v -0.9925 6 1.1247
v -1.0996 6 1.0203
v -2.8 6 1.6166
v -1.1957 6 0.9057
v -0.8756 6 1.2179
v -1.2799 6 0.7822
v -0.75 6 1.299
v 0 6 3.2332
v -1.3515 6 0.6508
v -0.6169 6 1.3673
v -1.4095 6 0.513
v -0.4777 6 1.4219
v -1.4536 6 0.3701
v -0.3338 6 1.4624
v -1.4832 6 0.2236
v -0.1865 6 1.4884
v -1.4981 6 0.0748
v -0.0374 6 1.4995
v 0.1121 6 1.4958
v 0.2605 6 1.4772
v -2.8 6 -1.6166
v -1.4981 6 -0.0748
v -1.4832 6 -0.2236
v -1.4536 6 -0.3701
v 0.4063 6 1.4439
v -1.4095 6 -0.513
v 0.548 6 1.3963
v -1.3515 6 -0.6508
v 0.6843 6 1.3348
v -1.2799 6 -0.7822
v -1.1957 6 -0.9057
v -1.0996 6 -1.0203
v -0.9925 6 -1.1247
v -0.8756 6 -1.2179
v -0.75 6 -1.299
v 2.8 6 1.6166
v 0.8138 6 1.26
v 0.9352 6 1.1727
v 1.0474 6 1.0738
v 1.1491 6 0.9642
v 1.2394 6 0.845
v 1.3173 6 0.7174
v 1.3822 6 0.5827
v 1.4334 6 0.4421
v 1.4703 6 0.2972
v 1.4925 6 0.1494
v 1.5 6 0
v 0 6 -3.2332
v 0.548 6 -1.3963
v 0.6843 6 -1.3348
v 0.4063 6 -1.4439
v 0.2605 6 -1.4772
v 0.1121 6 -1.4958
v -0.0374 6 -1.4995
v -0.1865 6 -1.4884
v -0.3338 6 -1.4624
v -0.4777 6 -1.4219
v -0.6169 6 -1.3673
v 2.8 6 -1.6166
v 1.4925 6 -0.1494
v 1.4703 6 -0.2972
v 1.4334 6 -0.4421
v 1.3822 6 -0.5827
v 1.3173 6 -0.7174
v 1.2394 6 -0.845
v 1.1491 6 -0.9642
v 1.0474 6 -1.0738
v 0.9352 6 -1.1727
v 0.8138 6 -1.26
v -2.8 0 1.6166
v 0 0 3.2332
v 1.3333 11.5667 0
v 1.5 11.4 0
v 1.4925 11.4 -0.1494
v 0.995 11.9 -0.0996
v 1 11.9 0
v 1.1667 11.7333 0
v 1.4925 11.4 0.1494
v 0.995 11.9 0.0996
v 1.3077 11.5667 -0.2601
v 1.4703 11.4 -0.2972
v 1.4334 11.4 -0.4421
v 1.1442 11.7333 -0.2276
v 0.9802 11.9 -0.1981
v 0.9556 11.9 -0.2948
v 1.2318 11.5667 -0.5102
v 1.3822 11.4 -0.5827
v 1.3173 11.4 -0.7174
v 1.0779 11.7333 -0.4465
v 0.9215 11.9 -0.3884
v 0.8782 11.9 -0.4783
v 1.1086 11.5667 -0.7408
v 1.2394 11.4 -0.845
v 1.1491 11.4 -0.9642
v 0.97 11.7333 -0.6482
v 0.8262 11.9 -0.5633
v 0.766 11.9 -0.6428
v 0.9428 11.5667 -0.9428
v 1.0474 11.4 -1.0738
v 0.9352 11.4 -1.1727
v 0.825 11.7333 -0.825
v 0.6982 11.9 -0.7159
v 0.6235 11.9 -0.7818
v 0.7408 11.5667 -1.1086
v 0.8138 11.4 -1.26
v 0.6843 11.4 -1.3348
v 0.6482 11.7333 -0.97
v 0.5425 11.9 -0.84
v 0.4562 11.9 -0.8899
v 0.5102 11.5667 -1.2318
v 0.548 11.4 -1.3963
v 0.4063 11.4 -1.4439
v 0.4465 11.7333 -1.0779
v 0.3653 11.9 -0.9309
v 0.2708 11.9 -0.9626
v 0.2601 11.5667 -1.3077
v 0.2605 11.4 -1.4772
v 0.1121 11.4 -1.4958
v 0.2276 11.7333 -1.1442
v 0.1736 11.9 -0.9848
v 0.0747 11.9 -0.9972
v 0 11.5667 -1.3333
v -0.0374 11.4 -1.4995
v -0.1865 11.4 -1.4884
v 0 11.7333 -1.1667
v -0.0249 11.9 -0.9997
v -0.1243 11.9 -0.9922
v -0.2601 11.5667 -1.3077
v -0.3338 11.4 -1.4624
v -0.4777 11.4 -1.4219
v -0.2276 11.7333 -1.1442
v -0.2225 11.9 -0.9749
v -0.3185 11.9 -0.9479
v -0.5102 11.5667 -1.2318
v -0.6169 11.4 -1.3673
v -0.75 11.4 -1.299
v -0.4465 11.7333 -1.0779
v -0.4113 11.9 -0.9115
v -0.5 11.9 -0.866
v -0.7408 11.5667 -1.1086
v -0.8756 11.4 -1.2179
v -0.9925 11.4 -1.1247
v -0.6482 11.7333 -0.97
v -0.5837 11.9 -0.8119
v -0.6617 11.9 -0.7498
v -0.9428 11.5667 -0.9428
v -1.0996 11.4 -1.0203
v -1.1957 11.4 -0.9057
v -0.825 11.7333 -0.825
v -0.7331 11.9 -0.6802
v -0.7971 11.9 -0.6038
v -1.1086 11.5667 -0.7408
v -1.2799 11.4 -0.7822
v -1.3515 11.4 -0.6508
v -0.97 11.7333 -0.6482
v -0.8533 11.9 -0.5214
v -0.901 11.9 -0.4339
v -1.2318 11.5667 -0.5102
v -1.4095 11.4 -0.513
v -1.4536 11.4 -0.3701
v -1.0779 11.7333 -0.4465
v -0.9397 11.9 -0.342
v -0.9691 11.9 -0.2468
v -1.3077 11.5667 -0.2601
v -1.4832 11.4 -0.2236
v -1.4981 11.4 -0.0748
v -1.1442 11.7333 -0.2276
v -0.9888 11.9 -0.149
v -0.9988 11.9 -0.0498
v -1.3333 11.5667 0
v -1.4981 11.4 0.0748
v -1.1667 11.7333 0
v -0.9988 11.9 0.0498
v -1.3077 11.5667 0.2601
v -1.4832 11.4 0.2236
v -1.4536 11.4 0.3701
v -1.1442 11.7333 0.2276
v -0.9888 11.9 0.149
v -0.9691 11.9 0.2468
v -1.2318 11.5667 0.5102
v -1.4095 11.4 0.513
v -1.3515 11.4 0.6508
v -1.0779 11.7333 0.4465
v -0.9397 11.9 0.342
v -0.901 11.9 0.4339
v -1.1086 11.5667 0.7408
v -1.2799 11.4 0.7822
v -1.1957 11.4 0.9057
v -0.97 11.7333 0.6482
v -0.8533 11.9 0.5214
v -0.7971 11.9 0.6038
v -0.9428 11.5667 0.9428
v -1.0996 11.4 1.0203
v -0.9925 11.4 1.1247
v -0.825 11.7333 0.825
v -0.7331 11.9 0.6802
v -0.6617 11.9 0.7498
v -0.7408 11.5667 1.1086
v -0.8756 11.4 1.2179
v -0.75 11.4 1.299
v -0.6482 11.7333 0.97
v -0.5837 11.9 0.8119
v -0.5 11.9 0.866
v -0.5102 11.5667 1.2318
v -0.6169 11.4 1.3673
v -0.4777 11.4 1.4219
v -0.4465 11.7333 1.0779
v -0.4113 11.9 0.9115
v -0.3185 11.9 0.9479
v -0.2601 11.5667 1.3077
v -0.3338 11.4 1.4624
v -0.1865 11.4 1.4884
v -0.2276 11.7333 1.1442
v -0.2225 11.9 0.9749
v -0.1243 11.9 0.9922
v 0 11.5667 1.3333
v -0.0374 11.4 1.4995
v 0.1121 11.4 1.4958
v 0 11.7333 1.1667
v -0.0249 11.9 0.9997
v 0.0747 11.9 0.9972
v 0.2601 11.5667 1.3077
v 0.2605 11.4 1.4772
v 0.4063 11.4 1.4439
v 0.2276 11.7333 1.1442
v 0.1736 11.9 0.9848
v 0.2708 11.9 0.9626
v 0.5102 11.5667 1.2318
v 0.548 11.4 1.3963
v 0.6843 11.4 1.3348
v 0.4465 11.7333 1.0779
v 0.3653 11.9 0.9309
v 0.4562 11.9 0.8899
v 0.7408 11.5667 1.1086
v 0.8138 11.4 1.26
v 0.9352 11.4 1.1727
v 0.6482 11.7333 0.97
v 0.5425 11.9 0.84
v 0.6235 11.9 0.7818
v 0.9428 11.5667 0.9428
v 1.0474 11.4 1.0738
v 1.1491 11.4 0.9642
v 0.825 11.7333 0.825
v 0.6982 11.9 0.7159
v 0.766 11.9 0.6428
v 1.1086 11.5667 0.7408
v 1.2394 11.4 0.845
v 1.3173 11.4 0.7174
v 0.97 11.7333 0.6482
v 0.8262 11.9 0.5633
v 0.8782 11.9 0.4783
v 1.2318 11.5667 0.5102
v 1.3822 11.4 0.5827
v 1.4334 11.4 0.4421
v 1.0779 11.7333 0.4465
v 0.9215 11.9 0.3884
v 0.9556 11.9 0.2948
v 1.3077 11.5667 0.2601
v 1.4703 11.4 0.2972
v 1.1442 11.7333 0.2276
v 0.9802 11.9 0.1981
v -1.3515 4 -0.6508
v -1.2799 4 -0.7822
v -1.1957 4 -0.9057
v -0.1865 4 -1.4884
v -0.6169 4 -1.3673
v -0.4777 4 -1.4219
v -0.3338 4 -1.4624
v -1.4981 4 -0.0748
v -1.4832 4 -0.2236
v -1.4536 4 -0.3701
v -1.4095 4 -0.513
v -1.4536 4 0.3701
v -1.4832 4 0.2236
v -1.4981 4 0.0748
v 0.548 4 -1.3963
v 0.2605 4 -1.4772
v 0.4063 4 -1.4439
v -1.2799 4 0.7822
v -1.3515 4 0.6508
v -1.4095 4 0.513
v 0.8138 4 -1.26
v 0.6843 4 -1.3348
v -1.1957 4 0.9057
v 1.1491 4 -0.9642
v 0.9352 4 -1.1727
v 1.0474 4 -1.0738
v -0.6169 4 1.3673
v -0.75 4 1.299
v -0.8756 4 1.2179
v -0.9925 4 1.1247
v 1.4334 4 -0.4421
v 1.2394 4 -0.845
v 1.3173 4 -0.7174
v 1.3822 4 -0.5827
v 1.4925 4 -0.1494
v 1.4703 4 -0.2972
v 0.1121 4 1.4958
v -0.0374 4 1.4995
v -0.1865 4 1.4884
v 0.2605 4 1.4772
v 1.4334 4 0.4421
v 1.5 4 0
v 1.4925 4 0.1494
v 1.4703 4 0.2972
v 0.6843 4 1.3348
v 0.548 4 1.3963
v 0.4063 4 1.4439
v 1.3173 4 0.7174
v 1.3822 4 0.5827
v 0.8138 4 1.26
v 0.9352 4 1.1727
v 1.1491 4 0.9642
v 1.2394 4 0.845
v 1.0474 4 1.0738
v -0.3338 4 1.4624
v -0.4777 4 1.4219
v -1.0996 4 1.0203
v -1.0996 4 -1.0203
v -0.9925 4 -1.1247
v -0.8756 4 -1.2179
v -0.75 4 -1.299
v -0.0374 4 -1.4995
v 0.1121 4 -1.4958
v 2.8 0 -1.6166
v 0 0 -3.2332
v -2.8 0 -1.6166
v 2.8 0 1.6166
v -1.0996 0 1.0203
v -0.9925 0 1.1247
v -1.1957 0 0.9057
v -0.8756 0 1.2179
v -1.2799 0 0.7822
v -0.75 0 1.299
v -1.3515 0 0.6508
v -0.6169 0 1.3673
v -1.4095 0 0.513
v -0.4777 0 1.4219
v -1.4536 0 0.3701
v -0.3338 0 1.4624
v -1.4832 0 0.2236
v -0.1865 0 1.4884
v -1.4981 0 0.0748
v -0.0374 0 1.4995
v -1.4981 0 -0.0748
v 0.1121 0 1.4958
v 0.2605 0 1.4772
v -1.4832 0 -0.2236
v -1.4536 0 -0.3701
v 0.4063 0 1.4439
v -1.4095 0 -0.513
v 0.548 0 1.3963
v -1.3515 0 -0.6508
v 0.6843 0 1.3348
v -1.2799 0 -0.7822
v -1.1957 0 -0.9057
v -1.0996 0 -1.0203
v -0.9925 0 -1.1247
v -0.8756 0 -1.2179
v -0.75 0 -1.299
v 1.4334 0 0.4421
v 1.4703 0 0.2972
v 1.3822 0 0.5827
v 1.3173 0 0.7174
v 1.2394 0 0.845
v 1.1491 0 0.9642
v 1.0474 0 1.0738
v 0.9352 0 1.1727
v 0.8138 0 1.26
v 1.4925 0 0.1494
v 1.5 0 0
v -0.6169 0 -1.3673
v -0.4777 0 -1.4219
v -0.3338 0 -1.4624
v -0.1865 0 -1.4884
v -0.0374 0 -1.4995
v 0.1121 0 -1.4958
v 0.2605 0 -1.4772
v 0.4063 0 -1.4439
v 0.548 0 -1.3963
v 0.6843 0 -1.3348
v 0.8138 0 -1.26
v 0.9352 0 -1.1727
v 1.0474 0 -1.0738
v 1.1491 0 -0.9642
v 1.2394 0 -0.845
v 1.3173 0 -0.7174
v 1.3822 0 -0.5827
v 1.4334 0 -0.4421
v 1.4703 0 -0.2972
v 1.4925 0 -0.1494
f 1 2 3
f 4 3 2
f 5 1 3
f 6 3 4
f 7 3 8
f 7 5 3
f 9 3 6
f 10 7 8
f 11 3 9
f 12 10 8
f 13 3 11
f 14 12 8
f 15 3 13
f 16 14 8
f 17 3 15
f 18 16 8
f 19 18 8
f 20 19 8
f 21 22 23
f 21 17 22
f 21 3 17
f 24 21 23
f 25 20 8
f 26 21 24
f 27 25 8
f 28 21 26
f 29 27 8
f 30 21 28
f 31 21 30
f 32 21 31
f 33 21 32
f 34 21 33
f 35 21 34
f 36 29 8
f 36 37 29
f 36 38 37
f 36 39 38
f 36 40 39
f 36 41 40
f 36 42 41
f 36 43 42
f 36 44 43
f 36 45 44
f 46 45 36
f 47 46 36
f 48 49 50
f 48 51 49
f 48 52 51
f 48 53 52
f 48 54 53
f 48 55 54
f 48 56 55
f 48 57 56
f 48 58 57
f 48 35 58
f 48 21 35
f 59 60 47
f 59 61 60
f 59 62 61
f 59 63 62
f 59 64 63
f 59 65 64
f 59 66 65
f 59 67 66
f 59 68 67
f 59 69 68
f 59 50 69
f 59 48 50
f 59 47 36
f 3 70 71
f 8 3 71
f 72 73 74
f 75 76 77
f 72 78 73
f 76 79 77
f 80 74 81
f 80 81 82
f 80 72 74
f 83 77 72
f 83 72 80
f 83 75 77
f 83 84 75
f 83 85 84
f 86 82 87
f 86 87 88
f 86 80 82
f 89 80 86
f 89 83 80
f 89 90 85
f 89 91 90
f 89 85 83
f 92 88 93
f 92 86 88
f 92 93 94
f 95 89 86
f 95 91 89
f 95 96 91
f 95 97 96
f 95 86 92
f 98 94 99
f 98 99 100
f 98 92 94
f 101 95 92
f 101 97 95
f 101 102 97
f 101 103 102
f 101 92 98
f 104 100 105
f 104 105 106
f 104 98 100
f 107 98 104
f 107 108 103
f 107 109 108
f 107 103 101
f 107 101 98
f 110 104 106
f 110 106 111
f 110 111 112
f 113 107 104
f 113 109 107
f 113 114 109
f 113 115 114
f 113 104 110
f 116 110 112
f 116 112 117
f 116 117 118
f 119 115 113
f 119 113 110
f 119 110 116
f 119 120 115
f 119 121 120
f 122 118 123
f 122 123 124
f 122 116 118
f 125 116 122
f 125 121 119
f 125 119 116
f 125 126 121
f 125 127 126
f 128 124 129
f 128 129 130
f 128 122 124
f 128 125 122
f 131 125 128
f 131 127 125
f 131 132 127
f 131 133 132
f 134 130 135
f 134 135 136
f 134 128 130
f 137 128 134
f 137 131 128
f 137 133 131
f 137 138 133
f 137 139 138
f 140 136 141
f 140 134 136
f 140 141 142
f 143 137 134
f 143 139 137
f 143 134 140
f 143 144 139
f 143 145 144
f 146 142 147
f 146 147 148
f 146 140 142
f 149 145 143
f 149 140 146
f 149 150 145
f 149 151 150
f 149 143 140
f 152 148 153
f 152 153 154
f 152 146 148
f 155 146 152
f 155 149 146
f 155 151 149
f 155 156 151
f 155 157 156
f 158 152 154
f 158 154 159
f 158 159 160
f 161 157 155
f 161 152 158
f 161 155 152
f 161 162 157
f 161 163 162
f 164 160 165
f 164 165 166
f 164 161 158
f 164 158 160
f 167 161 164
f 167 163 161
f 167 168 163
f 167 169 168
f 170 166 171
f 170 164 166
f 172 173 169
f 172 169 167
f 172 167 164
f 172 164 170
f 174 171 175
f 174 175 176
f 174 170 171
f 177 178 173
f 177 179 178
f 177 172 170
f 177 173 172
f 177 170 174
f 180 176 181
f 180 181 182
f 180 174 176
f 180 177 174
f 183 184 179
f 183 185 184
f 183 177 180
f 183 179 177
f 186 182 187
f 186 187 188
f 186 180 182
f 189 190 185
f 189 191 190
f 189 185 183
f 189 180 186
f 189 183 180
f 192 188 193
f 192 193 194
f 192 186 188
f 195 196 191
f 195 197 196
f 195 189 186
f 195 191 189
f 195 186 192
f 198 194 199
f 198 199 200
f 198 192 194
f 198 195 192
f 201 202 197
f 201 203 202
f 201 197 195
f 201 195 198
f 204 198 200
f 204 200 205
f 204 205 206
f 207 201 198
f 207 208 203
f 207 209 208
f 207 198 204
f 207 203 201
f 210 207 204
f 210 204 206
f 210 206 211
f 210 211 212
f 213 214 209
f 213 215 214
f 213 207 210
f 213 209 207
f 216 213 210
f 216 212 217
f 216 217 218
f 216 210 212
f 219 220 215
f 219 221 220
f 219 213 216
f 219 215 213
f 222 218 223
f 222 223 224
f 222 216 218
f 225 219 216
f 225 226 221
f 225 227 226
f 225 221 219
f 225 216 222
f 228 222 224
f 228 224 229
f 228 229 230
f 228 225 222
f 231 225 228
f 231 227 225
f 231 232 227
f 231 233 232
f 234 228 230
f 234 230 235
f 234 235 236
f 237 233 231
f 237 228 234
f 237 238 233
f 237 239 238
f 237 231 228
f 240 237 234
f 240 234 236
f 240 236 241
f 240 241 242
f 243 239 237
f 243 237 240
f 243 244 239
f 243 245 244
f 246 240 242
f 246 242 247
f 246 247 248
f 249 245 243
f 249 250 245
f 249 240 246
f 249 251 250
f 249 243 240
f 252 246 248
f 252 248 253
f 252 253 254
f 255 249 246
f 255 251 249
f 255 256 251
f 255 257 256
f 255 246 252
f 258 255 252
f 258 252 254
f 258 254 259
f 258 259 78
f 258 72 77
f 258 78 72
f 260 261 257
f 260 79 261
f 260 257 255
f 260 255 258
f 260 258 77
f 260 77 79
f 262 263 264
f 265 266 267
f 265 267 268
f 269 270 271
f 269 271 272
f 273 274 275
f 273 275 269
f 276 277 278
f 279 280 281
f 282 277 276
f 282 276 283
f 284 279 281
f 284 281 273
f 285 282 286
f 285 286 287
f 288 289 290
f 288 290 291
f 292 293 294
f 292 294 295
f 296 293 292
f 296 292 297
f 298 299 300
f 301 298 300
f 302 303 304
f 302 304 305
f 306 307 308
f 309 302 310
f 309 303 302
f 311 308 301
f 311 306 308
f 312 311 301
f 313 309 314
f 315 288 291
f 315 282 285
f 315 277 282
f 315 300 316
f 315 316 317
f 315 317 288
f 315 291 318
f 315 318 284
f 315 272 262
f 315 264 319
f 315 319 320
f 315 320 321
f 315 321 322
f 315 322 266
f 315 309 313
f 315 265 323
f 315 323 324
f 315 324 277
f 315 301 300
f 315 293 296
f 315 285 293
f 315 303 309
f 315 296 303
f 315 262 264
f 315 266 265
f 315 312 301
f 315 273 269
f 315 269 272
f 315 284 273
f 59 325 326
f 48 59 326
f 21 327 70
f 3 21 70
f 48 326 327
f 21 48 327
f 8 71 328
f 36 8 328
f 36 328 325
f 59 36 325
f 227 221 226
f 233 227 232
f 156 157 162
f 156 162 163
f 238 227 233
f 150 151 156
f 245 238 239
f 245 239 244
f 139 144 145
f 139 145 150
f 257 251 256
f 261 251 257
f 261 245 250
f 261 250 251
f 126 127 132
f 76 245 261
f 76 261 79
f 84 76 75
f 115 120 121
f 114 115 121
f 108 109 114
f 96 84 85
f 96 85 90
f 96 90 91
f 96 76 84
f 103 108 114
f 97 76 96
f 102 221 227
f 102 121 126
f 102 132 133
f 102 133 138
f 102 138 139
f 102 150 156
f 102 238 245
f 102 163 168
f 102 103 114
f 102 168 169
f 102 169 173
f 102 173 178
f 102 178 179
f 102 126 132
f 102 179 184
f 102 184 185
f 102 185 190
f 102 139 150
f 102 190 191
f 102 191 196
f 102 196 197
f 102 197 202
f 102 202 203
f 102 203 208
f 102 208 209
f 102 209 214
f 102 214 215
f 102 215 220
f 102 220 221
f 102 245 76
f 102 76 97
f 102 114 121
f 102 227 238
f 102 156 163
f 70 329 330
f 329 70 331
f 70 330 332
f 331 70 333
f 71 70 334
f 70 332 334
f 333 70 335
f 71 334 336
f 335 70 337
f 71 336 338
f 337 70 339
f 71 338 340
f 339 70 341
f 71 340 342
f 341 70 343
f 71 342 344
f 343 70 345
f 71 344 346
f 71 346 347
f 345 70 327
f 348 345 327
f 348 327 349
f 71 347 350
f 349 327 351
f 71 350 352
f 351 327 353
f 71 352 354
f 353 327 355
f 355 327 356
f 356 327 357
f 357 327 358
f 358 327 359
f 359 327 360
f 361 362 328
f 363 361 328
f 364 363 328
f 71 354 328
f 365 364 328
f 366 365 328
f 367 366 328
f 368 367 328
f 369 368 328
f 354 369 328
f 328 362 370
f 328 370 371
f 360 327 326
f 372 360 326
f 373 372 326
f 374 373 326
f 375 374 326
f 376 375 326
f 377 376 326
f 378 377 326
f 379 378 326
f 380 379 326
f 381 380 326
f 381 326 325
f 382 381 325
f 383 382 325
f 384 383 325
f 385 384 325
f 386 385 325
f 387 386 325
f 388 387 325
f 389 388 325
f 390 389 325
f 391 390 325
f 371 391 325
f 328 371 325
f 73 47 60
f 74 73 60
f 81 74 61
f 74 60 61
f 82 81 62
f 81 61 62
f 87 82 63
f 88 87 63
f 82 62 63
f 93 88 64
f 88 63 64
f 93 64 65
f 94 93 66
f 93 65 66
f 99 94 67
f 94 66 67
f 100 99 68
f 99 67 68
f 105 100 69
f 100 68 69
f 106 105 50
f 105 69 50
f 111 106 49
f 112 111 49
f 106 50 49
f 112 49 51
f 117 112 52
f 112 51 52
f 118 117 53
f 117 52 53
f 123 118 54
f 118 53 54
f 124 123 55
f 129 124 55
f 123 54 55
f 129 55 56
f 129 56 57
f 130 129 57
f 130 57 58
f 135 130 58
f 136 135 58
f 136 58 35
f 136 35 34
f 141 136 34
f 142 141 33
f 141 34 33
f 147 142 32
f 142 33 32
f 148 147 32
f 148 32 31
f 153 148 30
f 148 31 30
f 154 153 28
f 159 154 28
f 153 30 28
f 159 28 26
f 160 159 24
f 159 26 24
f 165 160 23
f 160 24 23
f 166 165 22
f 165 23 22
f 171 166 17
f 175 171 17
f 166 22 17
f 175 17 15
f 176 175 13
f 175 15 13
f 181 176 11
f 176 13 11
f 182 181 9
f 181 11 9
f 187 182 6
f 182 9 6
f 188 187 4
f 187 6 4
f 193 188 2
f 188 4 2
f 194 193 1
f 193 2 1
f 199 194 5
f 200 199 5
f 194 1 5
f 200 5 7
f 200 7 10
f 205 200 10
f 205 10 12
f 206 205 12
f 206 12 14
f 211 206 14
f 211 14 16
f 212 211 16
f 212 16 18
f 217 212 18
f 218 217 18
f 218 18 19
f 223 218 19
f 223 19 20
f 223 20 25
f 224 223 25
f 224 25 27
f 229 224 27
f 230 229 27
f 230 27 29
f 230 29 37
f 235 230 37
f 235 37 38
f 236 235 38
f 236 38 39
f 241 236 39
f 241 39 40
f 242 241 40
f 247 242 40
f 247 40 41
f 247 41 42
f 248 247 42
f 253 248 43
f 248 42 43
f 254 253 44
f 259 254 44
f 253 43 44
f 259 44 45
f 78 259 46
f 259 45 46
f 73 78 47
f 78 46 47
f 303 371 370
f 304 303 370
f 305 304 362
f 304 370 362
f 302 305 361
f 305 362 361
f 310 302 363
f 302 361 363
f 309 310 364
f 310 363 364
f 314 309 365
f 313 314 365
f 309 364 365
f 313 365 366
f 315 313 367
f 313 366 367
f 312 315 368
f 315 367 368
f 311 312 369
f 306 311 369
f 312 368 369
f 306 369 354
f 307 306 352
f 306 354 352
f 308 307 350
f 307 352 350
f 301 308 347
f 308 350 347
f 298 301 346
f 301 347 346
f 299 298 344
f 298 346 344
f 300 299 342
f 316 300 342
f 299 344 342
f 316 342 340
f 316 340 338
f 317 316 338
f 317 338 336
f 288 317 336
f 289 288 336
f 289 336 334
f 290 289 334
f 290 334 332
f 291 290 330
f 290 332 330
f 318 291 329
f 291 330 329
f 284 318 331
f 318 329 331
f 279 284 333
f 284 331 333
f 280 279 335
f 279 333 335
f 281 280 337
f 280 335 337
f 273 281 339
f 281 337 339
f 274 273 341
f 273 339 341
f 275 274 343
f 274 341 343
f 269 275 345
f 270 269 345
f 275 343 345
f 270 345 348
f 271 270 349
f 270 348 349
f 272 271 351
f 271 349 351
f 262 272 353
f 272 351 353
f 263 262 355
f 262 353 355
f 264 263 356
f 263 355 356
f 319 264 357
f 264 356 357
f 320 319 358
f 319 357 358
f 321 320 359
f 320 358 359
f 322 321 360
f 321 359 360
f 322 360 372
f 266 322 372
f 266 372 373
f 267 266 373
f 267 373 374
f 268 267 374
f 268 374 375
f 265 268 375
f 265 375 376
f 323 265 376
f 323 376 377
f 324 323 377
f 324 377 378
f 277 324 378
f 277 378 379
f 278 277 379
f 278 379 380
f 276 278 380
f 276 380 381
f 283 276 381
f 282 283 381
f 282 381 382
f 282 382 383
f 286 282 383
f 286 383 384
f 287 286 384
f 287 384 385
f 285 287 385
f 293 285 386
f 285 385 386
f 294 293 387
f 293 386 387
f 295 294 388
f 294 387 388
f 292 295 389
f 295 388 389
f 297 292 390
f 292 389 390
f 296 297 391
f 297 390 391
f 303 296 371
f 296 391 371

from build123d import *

# Parameters (mm, degrees)
BOSS_EXTRUDE1_DEPTH = 6
SKETCH2_R           = 1.5
BOSS_EXTRUDE2_DEPTH = 5.9
SKETCH3_R           = 1.5
CUT_EXTRUDE1_DEPTH  = 4
CHAMFER1_SIZE       = 0.5


with BuildPart() as part:
    # Sketch1 → Boss-Extrude1 (new body)
    with BuildSketch(Plane(origin=(0, 0, 0), x_dir=(1, 0, 0), z_dir=(0, 1, 0))):
        Polygon((0, -3.233161507), (2.8, -1.616580754), (2.8, 1.616580754), (0, 3.233161507), (-2.8, 1.616580754), (-2.8, -1.616580754), align=None)
    extrude(amount=BOSS_EXTRUDE1_DEPTH)

    # Sketch2 → Boss-Extrude2 (add)
    with BuildSketch(Plane(origin=(0, 6, 0), x_dir=(1, 0, 0), z_dir=(0, 1, 0))):
        Circle(SKETCH2_R)
    extrude(amount=BOSS_EXTRUDE2_DEPTH)

    # Sketch3 → Cut-Extrude1 (cut)
    with BuildSketch(Plane.XZ):
        Circle(SKETCH3_R)
    extrude(amount=-CUT_EXTRUDE1_DEPTH, mode=Mode.SUBTRACT)

    # Chamfer1
    chamfer1_edges = [part.edges().sort_by_distance(p)[0] for p in [
        (-1.5, 11.9, 0),
    ]]
    chamfer(chamfer1_edges, length=CHAMFER1_SIZE)


solid = part.part
